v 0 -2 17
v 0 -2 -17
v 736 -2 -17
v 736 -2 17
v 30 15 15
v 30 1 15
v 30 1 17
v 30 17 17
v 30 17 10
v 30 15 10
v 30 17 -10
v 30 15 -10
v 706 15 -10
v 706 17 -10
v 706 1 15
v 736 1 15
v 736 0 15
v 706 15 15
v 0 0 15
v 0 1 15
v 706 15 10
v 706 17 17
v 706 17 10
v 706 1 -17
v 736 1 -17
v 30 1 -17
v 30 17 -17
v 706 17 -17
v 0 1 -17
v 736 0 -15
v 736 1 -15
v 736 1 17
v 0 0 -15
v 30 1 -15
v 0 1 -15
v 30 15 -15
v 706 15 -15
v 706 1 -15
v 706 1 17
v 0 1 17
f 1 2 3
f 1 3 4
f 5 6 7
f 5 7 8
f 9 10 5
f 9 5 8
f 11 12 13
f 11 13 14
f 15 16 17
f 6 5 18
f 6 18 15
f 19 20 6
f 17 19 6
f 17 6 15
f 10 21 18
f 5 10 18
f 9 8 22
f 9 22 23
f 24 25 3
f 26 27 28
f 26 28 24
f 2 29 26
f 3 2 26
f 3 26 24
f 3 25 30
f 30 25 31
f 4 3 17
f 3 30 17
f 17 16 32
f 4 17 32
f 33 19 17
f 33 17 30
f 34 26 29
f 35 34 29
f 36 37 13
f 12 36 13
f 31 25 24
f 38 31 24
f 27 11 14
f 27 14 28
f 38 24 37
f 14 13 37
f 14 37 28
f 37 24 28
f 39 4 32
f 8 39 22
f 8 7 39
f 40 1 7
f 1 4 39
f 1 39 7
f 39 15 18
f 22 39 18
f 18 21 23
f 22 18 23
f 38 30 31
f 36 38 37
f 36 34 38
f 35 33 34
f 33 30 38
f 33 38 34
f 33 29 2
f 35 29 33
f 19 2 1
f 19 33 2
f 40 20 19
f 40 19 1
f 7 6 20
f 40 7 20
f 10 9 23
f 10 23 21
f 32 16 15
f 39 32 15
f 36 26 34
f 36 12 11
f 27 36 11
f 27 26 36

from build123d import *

# Parameters (mm, degrees)
EXTRUDE_1_DEPTH     = 736
SKETCH_2_W          = 30
SKETCH_2_H          = 16
CUT_EXTRUDE_1_DEPTH = 35


with BuildPart() as part:
    # Эскиз1 → Вытянуть-Тонкостенный1 (new body)
    with BuildSketch(Plane(origin=(0, 0, 0), x_dir=(0, 0, -1), z_dir=(1, 0, 0))):
        Polygon((-10, 15), (-15, 15), (-15, 0), (15, 0), (15, 15), (10, 15), (10, 17), (17, 17), (17, -2), (-17, -2), (-17, 17), (-10, 17), align=None)
    extrude(amount=EXTRUDE_1_DEPTH)

    # Эскиз2 → Вырез-Вытянуть1 (cut, through all)
    with BuildSketch(Plane(origin=(0, 0, -17), x_dir=(-1, 0, 0), z_dir=(0, 0, -1))):
        with Locations((-721, 9)):
            Rectangle(SKETCH_2_W, SKETCH_2_H)
        with Locations((-15, 9)):
            Rectangle(SKETCH_2_W, SKETCH_2_H)
    extrude(amount=-CUT_EXTRUDE_1_DEPTH, mode=Mode.SUBTRACT)


solid = part.part
